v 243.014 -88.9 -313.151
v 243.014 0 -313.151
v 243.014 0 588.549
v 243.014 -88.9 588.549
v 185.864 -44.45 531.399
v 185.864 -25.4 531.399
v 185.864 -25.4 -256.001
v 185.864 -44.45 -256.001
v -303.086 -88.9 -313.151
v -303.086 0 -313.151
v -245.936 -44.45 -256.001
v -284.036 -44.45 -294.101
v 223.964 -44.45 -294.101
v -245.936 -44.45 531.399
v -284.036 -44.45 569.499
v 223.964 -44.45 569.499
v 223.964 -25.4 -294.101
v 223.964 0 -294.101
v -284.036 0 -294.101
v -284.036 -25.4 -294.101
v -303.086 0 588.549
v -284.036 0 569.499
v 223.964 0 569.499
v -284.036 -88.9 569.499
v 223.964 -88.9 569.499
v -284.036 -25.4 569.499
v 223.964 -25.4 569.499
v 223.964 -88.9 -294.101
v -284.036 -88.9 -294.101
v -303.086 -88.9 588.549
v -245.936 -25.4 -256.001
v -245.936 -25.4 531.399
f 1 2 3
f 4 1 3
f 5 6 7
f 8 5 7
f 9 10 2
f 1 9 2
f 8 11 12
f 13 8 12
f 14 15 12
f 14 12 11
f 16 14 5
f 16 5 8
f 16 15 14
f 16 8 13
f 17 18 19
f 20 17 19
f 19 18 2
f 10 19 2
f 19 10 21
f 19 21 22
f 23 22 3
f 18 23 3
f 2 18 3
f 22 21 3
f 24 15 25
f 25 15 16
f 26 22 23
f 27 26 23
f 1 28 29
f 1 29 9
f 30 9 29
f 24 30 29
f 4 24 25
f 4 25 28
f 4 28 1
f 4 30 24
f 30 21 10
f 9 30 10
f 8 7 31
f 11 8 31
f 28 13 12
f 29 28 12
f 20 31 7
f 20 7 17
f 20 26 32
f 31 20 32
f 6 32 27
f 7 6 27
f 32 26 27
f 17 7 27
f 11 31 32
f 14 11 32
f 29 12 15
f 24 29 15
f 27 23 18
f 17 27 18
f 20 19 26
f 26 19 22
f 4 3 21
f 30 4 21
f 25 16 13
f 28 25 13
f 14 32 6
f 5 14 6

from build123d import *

# Parameters (mm, degrees)
F1_DEPTH = 88.9
F2_START = 25.4
F2_DEPTH = 19.05


with BuildPart() as f1:
    # F0 (on Front) → F1 (new body)
    with BuildSketch(Plane.XZ):
        Polygon((-284.0362622675, 569.4989632036), (-303.0862622675, 588.5489632036), (-303.0862622675, -313.1510367964), (-284.0362622675, -294.1010367964), align=None)
        Polygon((243.0137377325, 588.5489632036), (-303.0862622675, 588.5489632036), (-284.0362622675, 569.4989632036), (223.9637377325, 569.4989632036), align=None)
        Polygon((-284.0362622675, -294.1010367964), (-303.0862622675, -313.1510367964), (243.0137377325, -313.1510367964), (223.9637377325, -294.1010367964), align=None)
        Polygon((243.0137377325, -313.1510367964), (243.0137377325, 588.5489632036), (223.9637377325, 569.4989632036), (223.9637377325, -294.1010367964), align=None)
    extrude(amount=F1_DEPTH)

    # F0 (on Front) → F2 (join)
    with BuildSketch(Plane.XZ.offset(F2_START)):
        Polygon((223.9637377325, 569.4989632036), (-284.0362622675, 569.4989632036), (-245.9362622675, 531.3989632036), (185.8637377325, 531.3989632036), align=None)
        Polygon((-245.9362622675, 531.3989632036), (-284.0362622675, 569.4989632036), (-284.0362622675, -294.1010367964), (-245.9362622675, -256.0010367964), align=None)
        Polygon((223.9637377325, -294.1010367964), (223.9637377325, 569.4989632036), (185.8637377325, 531.3989632036), (185.8637377325, -256.0010367964), align=None)
        Polygon((-245.9362622675, -256.0010367964), (-284.0362622675, -294.1010367964), (223.9637377325, -294.1010367964), (185.8637377325, -256.0010367964), align=None)
    extrude(amount=F2_DEPTH)


solid = f1.part
